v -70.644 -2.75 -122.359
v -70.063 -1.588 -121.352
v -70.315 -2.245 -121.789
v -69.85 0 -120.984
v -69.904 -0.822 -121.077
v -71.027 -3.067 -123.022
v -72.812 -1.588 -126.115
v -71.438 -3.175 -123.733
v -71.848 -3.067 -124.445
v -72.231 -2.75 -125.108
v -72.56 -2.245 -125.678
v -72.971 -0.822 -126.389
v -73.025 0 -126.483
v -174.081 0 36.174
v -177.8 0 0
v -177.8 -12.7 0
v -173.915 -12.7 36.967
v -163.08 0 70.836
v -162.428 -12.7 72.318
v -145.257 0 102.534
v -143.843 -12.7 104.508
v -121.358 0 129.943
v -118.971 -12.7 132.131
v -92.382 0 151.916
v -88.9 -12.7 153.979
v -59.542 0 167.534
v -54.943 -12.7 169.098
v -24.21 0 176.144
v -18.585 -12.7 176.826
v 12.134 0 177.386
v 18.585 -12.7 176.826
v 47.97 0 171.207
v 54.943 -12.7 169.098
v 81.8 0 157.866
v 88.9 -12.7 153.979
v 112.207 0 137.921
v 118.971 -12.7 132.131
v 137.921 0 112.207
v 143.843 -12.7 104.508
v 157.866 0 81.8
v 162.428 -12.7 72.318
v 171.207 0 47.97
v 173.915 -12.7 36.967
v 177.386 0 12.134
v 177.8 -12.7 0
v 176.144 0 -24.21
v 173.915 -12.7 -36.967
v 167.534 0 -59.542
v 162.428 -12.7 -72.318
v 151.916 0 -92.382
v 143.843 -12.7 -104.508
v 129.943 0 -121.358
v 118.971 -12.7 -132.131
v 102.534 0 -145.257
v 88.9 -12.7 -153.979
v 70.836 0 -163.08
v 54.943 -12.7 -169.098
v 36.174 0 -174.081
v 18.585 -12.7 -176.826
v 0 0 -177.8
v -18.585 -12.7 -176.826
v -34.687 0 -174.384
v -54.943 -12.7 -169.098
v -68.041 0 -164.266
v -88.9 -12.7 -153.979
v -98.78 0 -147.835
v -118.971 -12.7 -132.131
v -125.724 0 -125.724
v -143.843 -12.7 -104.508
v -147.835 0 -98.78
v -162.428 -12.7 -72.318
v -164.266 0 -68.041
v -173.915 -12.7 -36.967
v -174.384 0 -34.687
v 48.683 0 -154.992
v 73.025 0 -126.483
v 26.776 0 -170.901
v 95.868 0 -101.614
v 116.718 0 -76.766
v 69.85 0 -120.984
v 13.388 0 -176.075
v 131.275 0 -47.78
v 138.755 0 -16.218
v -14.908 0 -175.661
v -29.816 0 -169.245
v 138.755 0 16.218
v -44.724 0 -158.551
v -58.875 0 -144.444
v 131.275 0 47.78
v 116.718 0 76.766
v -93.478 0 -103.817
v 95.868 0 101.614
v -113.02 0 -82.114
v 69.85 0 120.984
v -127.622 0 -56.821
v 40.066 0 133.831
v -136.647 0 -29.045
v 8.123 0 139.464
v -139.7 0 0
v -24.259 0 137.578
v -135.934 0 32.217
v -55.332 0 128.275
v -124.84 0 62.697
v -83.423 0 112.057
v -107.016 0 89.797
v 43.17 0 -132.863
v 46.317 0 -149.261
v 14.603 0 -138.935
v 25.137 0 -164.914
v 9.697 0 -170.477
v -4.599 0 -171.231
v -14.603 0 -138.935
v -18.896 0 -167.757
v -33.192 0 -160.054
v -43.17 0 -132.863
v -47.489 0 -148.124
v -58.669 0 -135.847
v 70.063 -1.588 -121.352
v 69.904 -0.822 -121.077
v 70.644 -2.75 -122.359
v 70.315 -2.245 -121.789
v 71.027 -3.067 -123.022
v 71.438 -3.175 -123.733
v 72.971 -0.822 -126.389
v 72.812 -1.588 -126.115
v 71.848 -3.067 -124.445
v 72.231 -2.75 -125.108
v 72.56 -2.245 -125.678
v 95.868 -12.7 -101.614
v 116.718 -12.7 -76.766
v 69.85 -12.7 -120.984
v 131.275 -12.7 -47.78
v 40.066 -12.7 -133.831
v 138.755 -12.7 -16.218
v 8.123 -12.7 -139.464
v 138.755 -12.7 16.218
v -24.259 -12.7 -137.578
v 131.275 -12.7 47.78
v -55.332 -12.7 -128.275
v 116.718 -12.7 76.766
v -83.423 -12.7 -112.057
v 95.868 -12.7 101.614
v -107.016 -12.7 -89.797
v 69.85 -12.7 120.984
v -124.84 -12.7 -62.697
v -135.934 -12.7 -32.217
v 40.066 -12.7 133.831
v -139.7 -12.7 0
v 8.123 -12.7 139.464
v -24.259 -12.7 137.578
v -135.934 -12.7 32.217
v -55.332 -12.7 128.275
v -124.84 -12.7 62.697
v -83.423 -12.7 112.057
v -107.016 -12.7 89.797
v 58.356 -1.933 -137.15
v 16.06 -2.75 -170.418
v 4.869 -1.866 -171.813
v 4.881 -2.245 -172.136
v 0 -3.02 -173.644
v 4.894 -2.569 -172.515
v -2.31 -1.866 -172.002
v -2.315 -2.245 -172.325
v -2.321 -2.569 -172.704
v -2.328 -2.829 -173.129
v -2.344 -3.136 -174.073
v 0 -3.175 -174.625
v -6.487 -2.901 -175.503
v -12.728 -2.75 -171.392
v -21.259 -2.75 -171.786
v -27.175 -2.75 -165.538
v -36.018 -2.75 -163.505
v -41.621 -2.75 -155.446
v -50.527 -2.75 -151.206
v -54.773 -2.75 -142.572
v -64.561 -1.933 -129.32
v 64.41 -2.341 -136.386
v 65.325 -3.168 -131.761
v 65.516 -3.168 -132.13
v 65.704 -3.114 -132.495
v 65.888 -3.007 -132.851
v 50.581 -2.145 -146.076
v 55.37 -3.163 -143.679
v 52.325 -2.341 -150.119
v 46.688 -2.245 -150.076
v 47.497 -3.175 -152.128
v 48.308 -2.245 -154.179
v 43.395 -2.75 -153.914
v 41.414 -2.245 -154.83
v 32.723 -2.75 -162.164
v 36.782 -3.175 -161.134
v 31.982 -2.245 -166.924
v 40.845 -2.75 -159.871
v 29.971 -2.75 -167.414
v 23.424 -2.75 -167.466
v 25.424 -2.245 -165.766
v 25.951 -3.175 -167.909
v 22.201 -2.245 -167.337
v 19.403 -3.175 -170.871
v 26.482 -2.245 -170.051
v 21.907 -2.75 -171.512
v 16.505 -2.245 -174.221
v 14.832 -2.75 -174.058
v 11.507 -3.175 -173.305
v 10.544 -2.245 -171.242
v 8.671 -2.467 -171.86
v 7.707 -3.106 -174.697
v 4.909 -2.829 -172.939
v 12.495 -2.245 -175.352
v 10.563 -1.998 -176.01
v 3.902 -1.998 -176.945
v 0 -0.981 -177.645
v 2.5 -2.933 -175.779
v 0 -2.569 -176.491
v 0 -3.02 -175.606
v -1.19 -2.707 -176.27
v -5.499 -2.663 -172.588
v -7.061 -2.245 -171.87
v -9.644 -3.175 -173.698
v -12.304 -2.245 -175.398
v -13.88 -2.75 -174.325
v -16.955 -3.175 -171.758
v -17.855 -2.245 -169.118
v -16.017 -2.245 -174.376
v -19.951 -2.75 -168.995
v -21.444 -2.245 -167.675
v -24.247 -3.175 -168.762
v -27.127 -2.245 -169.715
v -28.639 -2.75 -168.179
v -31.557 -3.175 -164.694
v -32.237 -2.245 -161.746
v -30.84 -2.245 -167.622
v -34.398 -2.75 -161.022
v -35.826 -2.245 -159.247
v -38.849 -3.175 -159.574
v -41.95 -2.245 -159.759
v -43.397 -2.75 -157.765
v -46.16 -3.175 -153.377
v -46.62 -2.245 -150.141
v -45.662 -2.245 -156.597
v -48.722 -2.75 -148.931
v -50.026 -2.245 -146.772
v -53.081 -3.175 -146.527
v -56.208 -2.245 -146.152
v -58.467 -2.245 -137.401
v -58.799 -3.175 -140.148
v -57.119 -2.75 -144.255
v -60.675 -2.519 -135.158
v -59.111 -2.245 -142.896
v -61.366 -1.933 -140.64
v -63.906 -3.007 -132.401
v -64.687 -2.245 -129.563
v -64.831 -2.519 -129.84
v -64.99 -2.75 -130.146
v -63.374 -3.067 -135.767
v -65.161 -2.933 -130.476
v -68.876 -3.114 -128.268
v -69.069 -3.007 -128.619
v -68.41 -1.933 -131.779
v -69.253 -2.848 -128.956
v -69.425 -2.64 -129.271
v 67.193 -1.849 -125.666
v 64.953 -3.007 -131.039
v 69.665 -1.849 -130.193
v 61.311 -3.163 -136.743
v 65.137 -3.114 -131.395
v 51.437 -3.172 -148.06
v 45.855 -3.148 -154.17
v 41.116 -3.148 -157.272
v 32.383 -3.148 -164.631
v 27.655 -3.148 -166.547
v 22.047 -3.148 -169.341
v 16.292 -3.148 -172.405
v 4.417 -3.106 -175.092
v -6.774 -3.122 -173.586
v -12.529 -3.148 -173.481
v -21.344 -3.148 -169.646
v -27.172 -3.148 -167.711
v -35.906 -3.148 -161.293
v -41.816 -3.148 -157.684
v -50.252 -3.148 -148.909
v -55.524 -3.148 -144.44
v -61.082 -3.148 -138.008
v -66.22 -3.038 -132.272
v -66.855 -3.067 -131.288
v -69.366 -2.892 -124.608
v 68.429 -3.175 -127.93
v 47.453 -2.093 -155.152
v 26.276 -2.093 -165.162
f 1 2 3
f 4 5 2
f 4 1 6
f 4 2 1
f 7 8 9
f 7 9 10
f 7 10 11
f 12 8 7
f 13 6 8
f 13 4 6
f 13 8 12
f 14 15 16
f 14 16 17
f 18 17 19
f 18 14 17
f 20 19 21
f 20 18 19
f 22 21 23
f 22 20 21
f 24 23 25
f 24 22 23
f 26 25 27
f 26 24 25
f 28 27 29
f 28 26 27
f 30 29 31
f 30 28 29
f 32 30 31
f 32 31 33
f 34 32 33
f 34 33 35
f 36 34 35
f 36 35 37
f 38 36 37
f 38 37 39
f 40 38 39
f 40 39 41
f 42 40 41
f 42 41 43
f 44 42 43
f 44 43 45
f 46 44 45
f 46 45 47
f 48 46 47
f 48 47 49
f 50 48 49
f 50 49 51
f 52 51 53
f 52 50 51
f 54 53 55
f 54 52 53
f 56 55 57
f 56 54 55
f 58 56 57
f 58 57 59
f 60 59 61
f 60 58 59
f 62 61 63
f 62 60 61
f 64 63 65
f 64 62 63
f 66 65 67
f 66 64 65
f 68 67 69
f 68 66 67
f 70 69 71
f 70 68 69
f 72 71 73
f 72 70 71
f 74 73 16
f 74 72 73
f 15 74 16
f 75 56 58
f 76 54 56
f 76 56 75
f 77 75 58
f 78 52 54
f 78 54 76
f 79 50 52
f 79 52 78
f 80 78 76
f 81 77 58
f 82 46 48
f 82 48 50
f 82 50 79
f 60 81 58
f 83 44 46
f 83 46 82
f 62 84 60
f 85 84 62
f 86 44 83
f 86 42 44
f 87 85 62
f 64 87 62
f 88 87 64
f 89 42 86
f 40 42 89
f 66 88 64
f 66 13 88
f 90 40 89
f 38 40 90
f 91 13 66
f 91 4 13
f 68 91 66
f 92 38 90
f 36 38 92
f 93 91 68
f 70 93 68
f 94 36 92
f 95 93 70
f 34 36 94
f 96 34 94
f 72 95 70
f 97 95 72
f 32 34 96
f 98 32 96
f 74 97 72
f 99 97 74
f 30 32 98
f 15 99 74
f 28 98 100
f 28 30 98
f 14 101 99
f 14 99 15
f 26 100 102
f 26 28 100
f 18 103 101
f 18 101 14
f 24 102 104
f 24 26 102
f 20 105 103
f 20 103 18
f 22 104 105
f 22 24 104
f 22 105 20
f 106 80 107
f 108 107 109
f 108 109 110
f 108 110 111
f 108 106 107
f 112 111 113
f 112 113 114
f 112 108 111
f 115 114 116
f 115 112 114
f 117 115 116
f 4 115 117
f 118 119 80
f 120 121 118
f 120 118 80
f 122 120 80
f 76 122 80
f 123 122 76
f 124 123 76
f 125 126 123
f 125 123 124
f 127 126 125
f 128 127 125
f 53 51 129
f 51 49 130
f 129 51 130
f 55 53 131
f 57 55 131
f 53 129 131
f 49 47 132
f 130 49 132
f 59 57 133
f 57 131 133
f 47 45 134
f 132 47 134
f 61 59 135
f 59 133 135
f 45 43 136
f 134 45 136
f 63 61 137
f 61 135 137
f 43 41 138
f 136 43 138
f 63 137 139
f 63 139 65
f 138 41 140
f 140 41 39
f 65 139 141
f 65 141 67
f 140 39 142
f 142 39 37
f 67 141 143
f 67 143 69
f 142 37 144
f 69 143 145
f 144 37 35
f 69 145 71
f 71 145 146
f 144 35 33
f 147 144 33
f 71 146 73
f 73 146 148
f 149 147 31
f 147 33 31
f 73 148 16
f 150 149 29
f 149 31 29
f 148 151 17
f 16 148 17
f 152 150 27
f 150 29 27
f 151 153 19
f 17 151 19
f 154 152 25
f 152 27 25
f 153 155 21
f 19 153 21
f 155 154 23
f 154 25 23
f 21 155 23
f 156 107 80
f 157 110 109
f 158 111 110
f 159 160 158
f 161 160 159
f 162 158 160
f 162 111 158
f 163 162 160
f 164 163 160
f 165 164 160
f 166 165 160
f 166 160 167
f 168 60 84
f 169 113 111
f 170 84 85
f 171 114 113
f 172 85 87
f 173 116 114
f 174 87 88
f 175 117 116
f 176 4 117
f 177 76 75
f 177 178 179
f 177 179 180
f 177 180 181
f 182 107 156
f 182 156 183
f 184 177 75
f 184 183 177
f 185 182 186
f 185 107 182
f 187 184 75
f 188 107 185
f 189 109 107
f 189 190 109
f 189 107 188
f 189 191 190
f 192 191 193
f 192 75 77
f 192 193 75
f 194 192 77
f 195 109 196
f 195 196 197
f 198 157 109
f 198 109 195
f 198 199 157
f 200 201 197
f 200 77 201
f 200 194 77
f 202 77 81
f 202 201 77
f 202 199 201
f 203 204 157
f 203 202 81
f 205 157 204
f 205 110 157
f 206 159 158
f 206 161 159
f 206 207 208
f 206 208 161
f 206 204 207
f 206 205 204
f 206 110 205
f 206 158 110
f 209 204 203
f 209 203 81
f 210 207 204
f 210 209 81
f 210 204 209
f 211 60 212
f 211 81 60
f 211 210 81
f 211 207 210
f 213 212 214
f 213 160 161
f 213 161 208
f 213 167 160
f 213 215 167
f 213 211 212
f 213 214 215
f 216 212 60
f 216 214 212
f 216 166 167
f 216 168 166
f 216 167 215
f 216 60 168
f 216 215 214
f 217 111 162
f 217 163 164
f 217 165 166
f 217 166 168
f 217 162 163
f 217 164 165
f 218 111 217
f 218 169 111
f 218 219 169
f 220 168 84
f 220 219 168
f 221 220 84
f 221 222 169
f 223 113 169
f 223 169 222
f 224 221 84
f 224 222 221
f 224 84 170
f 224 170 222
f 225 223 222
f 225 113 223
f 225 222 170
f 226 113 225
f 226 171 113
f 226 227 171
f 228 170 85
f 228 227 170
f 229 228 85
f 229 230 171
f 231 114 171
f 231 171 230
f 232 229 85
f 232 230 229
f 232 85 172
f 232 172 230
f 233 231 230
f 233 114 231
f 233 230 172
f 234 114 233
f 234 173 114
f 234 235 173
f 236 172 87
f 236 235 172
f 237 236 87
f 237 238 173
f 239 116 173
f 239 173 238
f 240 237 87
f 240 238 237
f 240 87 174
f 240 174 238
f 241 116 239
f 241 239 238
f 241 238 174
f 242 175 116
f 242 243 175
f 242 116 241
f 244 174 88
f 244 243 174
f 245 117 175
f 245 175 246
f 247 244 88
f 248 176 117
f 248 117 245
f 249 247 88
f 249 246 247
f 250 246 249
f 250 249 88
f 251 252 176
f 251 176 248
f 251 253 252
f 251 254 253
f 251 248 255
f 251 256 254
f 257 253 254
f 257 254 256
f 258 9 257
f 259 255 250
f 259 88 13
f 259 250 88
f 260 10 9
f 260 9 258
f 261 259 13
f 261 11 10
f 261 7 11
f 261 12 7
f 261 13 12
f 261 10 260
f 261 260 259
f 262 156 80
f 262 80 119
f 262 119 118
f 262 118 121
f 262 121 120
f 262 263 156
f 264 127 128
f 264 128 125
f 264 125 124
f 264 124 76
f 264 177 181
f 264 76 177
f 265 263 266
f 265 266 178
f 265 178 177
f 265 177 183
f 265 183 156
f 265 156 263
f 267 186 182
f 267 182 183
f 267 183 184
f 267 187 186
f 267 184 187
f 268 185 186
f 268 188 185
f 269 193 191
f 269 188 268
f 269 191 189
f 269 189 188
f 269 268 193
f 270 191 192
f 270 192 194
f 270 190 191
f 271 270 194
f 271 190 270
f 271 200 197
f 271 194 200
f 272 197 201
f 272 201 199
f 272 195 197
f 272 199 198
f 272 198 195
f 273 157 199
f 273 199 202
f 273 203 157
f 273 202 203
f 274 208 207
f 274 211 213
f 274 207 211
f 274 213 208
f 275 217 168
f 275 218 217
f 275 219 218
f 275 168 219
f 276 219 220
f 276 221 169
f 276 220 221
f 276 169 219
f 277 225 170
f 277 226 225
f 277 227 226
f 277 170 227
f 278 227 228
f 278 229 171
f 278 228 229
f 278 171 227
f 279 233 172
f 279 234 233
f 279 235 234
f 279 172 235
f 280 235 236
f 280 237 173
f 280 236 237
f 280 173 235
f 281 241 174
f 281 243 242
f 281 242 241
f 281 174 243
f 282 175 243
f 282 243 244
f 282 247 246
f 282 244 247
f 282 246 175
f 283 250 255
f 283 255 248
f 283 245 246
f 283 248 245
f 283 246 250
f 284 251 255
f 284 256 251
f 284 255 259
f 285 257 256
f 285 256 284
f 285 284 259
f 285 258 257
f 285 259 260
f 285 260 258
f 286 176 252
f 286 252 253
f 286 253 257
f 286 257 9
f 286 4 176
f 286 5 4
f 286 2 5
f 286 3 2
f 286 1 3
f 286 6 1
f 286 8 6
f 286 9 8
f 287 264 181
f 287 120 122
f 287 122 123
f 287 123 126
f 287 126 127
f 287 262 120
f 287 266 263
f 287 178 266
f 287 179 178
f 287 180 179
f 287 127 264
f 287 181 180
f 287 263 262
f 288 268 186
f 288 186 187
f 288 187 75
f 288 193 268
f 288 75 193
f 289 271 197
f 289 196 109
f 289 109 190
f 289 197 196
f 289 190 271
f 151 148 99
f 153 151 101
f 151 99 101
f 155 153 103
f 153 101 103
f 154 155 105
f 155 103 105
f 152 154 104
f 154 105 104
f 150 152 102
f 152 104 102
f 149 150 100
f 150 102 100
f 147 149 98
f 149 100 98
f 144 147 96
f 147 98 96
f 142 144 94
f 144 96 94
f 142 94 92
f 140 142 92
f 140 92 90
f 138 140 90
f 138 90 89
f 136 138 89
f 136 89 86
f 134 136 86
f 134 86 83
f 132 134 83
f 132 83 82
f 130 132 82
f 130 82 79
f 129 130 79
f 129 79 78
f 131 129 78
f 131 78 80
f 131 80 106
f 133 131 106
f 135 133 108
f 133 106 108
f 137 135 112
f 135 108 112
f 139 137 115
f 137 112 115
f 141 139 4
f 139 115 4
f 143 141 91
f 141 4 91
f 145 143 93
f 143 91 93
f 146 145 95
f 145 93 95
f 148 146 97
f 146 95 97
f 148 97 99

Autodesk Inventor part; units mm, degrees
sketch "Sketch1" plane through (0, 0, 0) normal (0, 1, 0) x (-1, 0, 0)
  circle A0 centre (0, 0) radius 139.7
  circle A1 centre (0, 0) radius 177.8
  dimension "innerDiameter" = 279.4
  dimension "outerDiameter" = 355.6
extrude "Extrusion1" add sketch "Sketch1" against normal blind 12.7
sketch "Sketch5" plane through (0, 0, 0) normal (0, 1, 0) x (1, 0, 0)
  line L0 (0, 0) -> (-88.9, 153.9793) construction
  circle A0 centre (0, 0) radius 177.8 construction
  line L1 (0, 0) -> (88.9, 153.9793) construction
  line L2 (0, 0) -> (0, 177.8) construction
  circle A1 centre (0, 0) radius 142.875 construction
  circle A2 centre (0, 0) radius 174.625 construction
  point P0 (71.4375, 123.7334)
  point P1 (0, 174.625)
  point P2 (-71.4375, 123.7334)
  dimension "camOuterDiameter" = 349.25
  dimension "arcForCam" = 30
  dimension "d12" = 30
  dimension "camInnerDiameter" = 285.75
ref_plane "Work Plane3" through (0, 0, 0) normal (0.8660254, 0, 0.5) x (0.5, 0, -0.8660254)
ref_plane "Work Plane4" through (0, 0, 0) normal (-1, 0, 0) x (0, 0, -1)
ref_plane "Work Plane5" through (0, 0, 0) normal (0.8660254, 0, -0.5) x (-0.5, 0, -0.8660254)
sketch "Sketch10" plane through (0, 0, 0) normal (0.8660254, 0, 0.5) x (0.5, 0, -0.8660254)
  line L0 (-177.8, 0) -> (177.8, 0) projected
  circle A0 centre (142.875, 0) radius 3.175
  point P0 (0, 0)
  dimension "camDiameter" = 6.35
  dimension "d30" = 142.875
sketch "Sketch12" plane through (0, 0, 0) normal (-1, 0, 0) x (0, 0, -1)
  circle A0 centre (174.625, 0) radius 3.175
  point P0 (0, 0)
  dimension "d31" = 174.625
  dimension "d32" = 6.35
sketch "Sketch13" plane through (0, 0, 0) normal (0.8660254, 0, -0.5) x (-0.5, 0, -0.8660254)
  circle A0 centre (142.875, 0) radius 3.175
  point P0 (0, 0)
  dimension "d33" = 6.35
  dimension "d34" = 142.875
loft "Loft2" cut profiles "Sketch10", "Sketch12", "Sketch13"
equation "\"d12\" = arcForCam"
equation "\"d30\" = 0.5 * camInnerDiameter"
equation "\"d31\" = 0.5 * camOuterDiameter"
equation "\"d32\" = camDiameter"
equation "\"d33\" = camDiameter"
equation "\"d34\" = 0.5 * camInnerDiameter"
properties part number "NewCam02"
